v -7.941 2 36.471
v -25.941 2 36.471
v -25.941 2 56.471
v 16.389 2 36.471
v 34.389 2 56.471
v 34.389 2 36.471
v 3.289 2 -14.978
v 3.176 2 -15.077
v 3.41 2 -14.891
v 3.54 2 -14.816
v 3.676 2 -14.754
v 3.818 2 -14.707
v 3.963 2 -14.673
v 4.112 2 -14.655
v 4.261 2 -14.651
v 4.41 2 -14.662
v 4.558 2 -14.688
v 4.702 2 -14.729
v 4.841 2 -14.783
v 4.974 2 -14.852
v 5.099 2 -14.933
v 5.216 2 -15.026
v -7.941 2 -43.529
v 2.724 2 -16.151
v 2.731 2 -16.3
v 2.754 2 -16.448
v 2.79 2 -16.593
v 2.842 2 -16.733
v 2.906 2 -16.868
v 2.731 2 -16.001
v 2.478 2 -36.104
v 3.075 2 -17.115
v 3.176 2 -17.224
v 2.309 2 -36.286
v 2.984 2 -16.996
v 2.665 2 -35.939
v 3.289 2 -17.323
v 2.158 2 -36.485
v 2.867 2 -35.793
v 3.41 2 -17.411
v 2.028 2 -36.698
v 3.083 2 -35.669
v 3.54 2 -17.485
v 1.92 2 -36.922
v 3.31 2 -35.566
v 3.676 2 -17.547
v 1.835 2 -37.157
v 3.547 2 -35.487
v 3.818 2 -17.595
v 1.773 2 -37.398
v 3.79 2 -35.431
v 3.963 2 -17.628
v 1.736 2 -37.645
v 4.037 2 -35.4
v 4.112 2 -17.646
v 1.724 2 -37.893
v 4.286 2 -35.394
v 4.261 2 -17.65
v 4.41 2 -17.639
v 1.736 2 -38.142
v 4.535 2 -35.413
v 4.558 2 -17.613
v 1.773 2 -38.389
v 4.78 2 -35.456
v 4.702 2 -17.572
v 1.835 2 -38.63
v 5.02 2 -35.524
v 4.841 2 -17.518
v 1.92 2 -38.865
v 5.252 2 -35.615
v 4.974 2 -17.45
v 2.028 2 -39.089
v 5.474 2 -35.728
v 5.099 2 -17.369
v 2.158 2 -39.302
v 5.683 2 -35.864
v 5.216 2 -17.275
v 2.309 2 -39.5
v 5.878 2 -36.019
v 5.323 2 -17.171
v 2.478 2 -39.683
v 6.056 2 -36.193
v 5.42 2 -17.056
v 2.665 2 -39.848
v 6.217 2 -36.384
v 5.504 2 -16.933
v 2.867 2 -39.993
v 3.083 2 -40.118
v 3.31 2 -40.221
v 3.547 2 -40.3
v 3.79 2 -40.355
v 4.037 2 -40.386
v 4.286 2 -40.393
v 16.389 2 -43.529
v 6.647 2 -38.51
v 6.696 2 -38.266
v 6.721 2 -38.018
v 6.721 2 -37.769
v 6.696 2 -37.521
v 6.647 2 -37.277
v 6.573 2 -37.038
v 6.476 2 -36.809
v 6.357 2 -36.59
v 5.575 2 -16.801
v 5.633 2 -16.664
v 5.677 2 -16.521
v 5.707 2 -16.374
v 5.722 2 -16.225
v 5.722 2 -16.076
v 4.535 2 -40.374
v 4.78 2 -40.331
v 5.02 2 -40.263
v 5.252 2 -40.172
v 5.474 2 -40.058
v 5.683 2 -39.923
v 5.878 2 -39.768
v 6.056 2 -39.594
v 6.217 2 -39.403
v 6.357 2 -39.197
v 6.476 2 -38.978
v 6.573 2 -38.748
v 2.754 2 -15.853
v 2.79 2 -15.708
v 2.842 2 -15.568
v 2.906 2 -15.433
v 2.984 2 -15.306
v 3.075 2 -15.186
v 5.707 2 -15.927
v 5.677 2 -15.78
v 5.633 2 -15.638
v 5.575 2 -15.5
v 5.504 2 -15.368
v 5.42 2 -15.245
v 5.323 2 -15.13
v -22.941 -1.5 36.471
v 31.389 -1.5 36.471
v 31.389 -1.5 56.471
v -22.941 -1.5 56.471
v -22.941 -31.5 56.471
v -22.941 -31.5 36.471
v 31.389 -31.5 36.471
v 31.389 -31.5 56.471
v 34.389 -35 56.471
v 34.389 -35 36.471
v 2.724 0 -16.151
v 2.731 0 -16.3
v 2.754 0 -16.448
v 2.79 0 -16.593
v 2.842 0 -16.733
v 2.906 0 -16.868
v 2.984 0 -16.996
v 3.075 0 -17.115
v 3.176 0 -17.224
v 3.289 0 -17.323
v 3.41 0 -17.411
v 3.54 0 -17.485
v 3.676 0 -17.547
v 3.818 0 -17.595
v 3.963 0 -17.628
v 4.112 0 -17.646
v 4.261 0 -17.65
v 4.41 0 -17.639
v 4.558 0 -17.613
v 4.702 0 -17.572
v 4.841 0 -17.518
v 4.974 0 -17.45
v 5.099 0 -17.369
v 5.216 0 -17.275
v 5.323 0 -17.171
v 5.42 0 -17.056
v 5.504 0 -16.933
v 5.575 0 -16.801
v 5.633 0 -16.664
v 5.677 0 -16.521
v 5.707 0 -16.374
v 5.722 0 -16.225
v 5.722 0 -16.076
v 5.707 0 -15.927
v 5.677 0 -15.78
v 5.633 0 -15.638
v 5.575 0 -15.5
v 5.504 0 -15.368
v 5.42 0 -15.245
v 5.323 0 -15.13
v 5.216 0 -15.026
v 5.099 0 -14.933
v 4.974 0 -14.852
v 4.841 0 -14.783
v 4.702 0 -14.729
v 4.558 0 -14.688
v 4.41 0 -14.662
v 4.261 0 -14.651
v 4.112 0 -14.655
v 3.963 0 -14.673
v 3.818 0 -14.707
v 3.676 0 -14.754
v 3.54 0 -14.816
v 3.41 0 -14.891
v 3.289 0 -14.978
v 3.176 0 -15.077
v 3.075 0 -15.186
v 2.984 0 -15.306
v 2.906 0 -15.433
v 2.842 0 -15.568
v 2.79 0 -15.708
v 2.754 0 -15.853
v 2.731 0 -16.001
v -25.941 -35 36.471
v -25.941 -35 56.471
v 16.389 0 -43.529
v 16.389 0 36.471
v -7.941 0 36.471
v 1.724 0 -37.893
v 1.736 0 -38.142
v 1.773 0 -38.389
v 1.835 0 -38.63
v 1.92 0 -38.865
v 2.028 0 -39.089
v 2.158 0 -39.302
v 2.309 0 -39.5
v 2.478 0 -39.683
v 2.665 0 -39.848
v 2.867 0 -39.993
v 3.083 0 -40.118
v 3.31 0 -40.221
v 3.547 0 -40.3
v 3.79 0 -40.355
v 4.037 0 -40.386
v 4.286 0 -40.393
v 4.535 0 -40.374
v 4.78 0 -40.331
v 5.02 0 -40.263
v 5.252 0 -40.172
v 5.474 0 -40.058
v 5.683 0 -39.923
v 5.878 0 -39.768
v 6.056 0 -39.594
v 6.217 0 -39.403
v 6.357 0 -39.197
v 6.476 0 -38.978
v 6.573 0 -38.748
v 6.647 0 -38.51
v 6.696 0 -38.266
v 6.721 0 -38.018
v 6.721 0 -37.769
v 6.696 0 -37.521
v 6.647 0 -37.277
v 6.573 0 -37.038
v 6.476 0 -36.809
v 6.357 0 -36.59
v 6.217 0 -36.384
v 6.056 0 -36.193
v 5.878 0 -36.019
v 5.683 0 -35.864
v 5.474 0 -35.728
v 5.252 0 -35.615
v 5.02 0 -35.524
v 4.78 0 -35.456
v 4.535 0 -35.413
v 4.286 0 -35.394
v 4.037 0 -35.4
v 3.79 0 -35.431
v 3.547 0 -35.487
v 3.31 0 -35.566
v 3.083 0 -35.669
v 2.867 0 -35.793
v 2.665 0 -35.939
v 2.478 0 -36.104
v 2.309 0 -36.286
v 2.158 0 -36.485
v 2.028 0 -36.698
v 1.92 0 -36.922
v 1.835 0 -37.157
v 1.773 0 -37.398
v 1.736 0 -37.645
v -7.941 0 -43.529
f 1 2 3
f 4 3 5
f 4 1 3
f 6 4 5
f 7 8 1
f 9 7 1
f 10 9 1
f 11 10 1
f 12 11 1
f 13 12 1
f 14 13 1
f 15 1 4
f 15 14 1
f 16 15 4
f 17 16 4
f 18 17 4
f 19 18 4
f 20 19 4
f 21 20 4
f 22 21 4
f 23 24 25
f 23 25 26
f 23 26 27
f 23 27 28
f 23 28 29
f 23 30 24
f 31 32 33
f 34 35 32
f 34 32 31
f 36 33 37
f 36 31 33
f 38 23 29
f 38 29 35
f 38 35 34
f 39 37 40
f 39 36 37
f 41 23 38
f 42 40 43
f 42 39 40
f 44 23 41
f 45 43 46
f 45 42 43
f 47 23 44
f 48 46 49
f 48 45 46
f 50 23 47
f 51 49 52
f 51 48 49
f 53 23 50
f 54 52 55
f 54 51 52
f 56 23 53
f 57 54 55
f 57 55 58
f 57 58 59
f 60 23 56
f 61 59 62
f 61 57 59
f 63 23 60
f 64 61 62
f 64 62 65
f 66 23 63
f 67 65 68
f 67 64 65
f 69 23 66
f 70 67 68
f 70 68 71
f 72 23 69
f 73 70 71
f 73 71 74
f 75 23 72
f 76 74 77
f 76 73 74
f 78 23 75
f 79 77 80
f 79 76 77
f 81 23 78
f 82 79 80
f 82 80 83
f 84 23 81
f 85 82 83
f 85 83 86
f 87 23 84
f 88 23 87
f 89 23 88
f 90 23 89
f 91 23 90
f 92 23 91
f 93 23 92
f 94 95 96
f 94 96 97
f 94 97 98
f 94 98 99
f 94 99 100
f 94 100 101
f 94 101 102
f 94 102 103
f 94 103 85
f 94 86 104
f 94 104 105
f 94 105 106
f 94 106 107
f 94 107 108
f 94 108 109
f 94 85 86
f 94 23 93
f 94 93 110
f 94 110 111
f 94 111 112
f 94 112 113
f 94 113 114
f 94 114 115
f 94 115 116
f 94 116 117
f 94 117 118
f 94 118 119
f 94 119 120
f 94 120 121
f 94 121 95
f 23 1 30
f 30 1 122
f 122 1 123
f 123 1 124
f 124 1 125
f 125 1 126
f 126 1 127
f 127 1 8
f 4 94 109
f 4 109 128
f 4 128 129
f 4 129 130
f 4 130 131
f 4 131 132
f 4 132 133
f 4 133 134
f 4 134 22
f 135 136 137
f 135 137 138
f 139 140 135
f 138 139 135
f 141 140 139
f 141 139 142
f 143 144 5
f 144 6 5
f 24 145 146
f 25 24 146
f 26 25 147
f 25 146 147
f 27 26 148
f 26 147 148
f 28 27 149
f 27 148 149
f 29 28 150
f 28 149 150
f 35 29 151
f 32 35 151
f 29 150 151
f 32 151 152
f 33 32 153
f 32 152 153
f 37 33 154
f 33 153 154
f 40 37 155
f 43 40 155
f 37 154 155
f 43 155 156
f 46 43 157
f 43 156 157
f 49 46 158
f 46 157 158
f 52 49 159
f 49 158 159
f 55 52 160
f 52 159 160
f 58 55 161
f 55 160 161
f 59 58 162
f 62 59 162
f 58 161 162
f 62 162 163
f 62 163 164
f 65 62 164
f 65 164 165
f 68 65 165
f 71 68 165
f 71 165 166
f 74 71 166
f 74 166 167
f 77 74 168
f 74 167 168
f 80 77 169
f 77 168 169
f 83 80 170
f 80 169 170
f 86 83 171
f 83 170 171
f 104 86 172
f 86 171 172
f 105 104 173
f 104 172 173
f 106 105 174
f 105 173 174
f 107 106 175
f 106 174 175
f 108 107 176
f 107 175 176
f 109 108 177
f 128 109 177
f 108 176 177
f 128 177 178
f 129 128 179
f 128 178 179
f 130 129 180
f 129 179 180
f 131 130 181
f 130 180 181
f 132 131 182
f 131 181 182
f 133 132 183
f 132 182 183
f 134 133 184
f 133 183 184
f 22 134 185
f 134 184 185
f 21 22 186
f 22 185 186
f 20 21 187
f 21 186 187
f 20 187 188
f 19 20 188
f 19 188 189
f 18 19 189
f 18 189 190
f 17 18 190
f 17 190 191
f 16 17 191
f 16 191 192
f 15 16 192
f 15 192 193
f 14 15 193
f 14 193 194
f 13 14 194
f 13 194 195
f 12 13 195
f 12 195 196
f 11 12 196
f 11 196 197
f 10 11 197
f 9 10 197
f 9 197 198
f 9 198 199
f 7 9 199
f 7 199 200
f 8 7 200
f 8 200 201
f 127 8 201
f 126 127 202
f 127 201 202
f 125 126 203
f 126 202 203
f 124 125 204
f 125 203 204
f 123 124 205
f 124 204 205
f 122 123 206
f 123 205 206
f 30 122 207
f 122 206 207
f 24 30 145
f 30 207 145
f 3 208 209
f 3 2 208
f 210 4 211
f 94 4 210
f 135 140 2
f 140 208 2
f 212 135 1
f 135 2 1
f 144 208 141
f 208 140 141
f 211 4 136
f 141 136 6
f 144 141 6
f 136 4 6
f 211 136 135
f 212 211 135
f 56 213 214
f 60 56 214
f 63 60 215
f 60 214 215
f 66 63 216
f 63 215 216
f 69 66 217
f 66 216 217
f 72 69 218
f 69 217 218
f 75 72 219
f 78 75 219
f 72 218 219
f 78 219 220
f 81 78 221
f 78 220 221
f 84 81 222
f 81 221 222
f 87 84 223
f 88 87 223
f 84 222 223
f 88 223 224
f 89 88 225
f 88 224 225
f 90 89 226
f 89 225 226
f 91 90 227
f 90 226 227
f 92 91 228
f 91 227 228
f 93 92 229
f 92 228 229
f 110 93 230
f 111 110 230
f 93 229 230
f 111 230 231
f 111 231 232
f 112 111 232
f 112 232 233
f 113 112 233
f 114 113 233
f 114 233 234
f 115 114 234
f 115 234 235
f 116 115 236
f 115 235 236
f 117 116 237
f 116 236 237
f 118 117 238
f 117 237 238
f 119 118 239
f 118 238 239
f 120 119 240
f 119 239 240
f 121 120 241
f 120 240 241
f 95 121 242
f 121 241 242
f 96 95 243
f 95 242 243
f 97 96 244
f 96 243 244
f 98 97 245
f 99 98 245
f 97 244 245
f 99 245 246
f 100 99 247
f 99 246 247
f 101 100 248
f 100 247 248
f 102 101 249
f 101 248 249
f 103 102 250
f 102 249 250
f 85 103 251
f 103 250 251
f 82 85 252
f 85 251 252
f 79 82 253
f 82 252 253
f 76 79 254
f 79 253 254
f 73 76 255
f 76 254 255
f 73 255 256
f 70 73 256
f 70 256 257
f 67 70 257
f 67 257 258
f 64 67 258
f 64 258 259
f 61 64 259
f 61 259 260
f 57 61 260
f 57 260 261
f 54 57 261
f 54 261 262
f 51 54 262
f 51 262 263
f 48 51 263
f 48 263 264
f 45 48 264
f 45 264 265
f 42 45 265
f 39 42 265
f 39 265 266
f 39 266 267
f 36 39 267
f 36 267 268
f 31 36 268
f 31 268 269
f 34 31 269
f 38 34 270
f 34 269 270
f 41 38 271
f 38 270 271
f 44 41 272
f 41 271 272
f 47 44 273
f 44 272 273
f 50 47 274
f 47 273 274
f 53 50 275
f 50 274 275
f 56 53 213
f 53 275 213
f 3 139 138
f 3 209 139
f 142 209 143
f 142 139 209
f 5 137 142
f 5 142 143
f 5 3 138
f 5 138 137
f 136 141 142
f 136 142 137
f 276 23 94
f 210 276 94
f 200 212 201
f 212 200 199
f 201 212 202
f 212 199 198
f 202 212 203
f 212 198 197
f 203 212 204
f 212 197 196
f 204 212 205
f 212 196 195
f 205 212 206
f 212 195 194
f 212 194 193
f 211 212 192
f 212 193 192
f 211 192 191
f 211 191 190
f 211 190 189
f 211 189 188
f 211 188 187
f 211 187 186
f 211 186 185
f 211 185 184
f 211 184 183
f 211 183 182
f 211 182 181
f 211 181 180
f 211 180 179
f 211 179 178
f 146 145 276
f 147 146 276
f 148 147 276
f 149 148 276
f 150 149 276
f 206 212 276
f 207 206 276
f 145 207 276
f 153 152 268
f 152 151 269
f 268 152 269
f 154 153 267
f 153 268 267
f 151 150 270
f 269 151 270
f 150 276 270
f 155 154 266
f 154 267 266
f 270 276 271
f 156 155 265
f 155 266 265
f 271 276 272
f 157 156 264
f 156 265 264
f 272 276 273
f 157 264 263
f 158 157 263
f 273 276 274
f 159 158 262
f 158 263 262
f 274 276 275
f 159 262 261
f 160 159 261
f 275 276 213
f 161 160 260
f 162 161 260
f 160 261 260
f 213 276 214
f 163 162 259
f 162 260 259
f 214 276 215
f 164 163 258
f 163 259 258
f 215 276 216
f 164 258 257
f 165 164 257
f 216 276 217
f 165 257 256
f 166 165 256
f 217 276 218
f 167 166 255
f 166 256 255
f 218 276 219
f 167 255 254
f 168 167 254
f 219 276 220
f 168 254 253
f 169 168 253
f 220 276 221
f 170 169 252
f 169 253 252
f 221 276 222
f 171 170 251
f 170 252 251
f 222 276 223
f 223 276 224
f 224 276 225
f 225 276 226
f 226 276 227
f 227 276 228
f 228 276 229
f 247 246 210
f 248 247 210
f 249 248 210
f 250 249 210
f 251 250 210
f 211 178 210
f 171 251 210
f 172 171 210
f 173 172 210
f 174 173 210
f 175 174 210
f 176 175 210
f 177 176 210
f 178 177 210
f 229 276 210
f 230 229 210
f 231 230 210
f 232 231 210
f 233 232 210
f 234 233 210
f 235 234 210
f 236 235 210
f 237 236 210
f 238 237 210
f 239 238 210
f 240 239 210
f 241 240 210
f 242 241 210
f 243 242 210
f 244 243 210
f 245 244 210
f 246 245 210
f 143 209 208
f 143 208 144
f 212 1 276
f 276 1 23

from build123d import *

# Parameters (mm, degrees)
BOSS_EXTRUDE1_DEPTH = 2
SKETCH3_W           = 60.33
SKETCH3_H           = 20
BOSS_EXTRUDE2_DEPTH = 30
SKETCH4_W           = 54.33
SKETCH4_H           = 27
CUT_EXTRUDE1_DEPTH  = 20
SKETCH5_R           = 1.5
CUT_EXTRUDE2_DEPTH  = 2
SKETCH6_W           = 60.33
SKETCH6_H           = 20
BOSS_EXTRUDE3_DEPTH = 5
SKETCH8_W           = 54.33
SKETCH8_H           = 20
CUT_EXTRUDE3_DEPTH  = 3
SKETCH9_W           = 24.33
SKETCH9_H           = 20
BOSS_EXTRUDE4_DEPTH = 2
SKETCH10_R          = 2.5
CUT_EXTRUDE4_DEPTH  = 2


with BuildPart() as part:
    # Sketch2 → Boss-Extrude1 (new body)
    with BuildSketch(Plane(origin=(0, 0, 0), x_dir=(1, 0, 0), z_dir=(0, 1, 0))):
        Polygon((-7.941176471, 23.529411765), (16.388823529, 23.529411765), (16.388823529, -36.470588235), (34.388823529, -36.470588235), (34.388823529, -56.470588235), (-25.941176471, -56.470588235), (-25.941176471, -36.470588235), (-7.941176471, -36.470588235), align=None)
    extrude(amount=BOSS_EXTRUDE1_DEPTH)

    # Sketch3 → Boss-Extrude2 (add)
    with BuildSketch(Plane(origin=(0, 0, 0), x_dir=(-1, 0, 0), z_dir=(0, -1, 0))):
        with Locations((-4.223823529, -46.470588235)):
            Rectangle(SKETCH3_W, SKETCH3_H)
    extrude(amount=BOSS_EXTRUDE2_DEPTH)

    # Sketch4 → Cut-Extrude1 (cut)
    with BuildSketch(Plane(origin=(0, 0, 36.470588235), x_dir=(-1, 0, 0), z_dir=(0, 0, -1))):
        with Locations((-4.223823529, -15)):
            Rectangle(SKETCH4_W, SKETCH4_H)
    extrude(amount=-CUT_EXTRUDE1_DEPTH, mode=Mode.SUBTRACT)

    # Sketch5 → Cut-Extrude2 (cut)
    with BuildSketch(Plane(origin=(0, 0, 0), x_dir=(-1, 0, 0), z_dir=(0, -1, 0))):
        with Locations((-4.223823529, 16.1506031)):
            Circle(SKETCH5_R)
    extrude(amount=-CUT_EXTRUDE2_DEPTH, mode=Mode.SUBTRACT)

    # Sketch6 → Boss-Extrude3 (add)
    with BuildSketch(Plane.XZ.offset(30)):
        with Locations((4.223823529, 46.470588235)):
            Rectangle(SKETCH6_W, SKETCH6_H)
    extrude(amount=BOSS_EXTRUDE3_DEPTH)

    # Sketch8 → Cut-Extrude3 (cut)
    with BuildSketch(Plane(origin=(0, -28.5, 0), x_dir=(1, 0, 0), z_dir=(0, 1, 0))):
        with Locations((4.223823529, -46.470588235)):
            Rectangle(SKETCH8_W, SKETCH8_H)
    extrude(amount=-CUT_EXTRUDE3_DEPTH, mode=Mode.SUBTRACT)

    # Sketch9 → Boss-Extrude4 (add)
    with BuildSketch(Plane(origin=(0, 2, 0), x_dir=(1, 0, 0), z_dir=(0, 1, 0))):
        with Locations((4.223823529, 33.529411765)):
            Rectangle(SKETCH9_W, SKETCH9_H)
    extrude(amount=-BOSS_EXTRUDE4_DEPTH)

    # Sketch10 → Cut-Extrude4 (cut)
    with BuildSketch(Plane(origin=(0, 0, 0), x_dir=(-1, 0, 0), z_dir=(0, -1, 0))):
        with Locations((-4.223823529, 37.893427201)):
            Circle(SKETCH10_R)
    extrude(amount=-CUT_EXTRUDE4_DEPTH, mode=Mode.SUBTRACT)


solid = part.part
